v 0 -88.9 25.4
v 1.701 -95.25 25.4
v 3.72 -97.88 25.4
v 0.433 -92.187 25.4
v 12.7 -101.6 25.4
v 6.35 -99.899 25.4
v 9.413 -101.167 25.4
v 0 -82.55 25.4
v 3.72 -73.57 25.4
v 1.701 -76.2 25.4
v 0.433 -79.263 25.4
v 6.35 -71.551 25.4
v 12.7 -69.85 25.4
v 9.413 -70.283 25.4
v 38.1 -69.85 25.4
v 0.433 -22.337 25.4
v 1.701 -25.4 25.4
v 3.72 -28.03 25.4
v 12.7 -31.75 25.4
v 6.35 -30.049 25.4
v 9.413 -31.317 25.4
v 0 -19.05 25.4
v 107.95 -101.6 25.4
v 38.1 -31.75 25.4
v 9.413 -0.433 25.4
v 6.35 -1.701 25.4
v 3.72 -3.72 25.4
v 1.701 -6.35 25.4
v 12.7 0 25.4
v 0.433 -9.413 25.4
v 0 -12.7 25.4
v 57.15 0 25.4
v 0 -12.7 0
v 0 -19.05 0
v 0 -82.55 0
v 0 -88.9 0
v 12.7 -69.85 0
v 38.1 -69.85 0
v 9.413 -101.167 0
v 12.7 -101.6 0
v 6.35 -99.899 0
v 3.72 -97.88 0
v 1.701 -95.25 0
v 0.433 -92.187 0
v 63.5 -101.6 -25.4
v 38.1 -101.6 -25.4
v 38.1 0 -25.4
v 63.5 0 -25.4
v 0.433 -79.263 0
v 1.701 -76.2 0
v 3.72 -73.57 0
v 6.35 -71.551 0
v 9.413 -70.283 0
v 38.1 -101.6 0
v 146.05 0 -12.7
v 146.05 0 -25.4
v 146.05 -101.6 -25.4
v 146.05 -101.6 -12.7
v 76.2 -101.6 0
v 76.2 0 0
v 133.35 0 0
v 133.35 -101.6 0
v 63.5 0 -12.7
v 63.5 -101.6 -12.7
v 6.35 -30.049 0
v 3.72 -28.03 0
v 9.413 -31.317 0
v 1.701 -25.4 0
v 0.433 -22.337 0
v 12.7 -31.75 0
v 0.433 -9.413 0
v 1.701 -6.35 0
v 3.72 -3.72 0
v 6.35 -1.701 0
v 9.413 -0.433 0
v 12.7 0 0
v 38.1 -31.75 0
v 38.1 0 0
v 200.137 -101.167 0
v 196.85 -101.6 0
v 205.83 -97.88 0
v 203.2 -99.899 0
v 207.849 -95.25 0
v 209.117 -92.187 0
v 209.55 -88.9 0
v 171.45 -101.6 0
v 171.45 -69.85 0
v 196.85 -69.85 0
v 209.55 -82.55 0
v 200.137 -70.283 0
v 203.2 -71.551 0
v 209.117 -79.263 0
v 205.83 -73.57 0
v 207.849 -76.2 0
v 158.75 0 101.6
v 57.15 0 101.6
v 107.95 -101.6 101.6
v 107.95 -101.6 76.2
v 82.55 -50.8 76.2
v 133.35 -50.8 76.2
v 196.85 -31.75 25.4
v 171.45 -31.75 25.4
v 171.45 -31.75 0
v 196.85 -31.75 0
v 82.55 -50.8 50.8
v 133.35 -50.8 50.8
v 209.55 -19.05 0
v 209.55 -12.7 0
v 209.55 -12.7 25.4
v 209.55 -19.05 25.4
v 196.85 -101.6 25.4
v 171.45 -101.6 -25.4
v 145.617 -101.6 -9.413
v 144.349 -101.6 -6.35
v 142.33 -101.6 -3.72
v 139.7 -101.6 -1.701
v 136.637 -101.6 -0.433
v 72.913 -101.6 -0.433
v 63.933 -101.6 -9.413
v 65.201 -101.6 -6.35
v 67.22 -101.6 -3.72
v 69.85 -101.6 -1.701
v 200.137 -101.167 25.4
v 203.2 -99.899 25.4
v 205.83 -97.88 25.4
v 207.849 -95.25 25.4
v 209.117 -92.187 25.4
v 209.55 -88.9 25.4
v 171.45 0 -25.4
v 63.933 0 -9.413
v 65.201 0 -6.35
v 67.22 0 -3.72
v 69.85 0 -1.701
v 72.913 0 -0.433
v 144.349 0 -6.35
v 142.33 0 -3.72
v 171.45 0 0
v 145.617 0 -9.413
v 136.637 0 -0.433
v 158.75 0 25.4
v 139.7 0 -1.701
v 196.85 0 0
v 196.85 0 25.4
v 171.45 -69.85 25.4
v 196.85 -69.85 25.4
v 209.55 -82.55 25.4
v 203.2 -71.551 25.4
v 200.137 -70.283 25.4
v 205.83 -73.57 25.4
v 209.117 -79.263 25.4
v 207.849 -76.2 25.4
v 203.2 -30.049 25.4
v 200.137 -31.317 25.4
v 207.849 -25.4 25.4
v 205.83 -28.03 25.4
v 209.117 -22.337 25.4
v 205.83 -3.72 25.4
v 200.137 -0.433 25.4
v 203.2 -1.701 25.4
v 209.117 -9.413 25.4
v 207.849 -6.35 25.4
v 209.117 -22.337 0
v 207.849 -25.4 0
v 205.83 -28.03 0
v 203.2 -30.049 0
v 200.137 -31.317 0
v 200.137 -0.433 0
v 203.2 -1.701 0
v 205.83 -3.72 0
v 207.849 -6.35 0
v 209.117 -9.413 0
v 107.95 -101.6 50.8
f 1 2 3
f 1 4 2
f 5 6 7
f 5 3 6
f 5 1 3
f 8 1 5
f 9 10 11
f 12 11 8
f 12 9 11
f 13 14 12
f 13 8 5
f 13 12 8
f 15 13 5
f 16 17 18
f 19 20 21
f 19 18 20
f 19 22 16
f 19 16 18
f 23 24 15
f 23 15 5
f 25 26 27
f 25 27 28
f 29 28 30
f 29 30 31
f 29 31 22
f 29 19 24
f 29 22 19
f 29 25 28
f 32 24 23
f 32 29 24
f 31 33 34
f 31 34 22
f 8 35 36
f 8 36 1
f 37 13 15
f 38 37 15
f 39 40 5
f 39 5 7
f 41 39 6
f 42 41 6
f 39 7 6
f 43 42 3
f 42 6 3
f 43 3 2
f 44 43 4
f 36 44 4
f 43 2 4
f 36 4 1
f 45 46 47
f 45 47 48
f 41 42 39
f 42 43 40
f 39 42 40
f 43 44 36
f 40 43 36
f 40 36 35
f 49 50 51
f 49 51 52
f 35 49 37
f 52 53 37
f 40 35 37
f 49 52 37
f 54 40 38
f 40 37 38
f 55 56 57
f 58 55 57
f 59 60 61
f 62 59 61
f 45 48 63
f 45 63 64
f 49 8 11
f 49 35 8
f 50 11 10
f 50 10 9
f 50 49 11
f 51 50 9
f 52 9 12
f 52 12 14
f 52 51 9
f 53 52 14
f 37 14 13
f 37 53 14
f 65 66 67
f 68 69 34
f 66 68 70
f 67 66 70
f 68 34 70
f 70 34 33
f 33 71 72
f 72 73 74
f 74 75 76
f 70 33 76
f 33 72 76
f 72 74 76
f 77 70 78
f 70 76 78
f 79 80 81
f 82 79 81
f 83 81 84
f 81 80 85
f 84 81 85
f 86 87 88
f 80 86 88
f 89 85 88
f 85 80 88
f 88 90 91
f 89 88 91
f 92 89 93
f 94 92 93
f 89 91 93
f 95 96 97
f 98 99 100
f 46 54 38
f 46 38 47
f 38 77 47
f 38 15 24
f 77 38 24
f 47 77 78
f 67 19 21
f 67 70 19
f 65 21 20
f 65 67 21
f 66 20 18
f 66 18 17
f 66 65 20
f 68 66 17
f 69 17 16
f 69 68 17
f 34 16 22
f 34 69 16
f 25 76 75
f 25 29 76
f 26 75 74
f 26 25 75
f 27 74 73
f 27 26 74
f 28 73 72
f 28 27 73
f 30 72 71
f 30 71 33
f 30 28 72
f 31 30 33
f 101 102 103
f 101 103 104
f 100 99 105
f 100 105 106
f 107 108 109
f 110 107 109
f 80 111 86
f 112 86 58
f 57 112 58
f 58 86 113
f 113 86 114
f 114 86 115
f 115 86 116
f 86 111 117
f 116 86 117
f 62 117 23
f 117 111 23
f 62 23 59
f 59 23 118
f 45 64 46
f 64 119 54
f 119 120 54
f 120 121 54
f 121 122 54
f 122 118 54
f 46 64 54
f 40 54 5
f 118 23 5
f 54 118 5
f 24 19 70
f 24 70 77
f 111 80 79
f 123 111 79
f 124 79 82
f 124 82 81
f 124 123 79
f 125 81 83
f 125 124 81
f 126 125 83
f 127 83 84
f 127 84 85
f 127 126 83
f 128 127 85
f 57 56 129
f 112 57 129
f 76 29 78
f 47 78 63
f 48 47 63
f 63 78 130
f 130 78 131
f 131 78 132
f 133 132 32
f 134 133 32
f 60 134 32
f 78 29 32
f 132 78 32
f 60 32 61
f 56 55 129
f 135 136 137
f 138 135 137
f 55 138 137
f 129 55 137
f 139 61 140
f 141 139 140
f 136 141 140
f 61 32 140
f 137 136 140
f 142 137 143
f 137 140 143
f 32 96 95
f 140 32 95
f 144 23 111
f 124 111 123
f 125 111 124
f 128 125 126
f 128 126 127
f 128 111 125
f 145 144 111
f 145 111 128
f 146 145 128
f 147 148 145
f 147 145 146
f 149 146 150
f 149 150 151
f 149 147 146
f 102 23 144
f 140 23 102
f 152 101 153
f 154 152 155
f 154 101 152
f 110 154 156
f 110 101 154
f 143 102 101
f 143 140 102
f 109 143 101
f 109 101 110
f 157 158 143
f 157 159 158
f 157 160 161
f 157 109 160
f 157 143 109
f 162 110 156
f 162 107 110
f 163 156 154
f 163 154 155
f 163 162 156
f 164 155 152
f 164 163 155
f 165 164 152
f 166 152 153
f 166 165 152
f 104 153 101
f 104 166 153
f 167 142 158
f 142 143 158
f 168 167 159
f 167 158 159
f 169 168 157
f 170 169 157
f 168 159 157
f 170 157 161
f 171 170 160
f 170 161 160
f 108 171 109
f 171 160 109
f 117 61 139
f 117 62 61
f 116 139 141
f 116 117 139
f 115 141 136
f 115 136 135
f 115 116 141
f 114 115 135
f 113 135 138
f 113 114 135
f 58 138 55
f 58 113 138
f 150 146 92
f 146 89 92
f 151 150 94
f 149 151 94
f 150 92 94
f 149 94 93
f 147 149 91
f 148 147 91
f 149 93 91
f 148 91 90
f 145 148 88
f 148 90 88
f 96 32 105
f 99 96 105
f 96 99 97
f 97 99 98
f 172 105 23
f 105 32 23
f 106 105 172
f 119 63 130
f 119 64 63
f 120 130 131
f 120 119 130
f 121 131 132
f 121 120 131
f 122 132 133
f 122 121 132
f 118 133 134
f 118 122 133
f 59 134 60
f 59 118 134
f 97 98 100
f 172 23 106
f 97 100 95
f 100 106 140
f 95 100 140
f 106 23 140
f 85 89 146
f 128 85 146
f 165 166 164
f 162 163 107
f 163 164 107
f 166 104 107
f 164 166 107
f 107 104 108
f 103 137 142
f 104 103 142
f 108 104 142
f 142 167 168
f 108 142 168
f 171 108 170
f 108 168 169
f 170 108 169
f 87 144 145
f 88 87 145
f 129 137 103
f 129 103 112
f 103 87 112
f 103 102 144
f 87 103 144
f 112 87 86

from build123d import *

# Parameters (mm, degrees)
F0_W      = 209.55
F0_H      = 25.4
F1_DEPTH  = 101.6
F2_W      = 38.1
F2_H      = 38.1
F3_DEPTH  = 25.401
F5_DEPTH  = 25.4
F6_W      = 82.55
F6_H      = 101.6
F7_DEPTH  = 25.4
F9_DEPTH  = 76.2
F10_W     = 50.8
F10_H     = 25.4
F11_DEPTH = 50.8
F12_R     = 12.7


with BuildPart() as f1:
    # F0 (on Front) → F1 (new body)
    with BuildSketch(Plane.XZ):
        with Locations((104.775, 12.7)):
            Rectangle(F0_W, F0_H)
    extrude(amount=F1_DEPTH)

    # F2 (on face) → F3 (cut, through all)
    with BuildSketch(Plane.XY.offset(25.4)):
        with Locations((19.05, -50.8)):
            Rectangle(F2_W, F2_H)
        with Locations((190.5, -50.8)):
            Rectangle(F2_W, F2_H)
    extrude(amount=-F3_DEPTH, mode=Mode.SUBTRACT)

    # F4 (on face) → F5 (join)
    with BuildSketch(Plane(origin=(0, 0, 0), x_dir=(1, 0, 0), z_dir=(0, 0, -1))):
        Polygon((171.45, 101.6), (38.1, 101.6), (38.1, 69.85), (38.1, 31.75), (38.1, 0), (171.45, 0), (171.45, 31.75), (171.45, 69.85), align=None)
    extrude(amount=F5_DEPTH)

    # F6 (on face) → F7 (cut)
    with BuildSketch(Plane(origin=(0, 0, -25.4), x_dir=(1, 0, 0), z_dir=(0, 0, -1))):
        with Locations((104.775, 50.8)):
            Rectangle(F6_W, F6_H)
    extrude(amount=-F7_DEPTH, mode=Mode.SUBTRACT)

    # F8 (on face) → F9 (join)
    with BuildSketch(Plane.XY.offset(25.4)):
        Polygon((158.75, 0), (57.15, 0), (107.95, -101.6), align=None)
    extrude(amount=F9_DEPTH)

    # F10 (on face) → F11 (cut)
    with BuildSketch(Plane.XZ.offset(101.6)):
        with Locations((107.95, 63.5)):
            Rectangle(F10_W, F10_H)
    extrude(amount=-F11_DEPTH, mode=Mode.SUBTRACT)

    # F12
    f12_edges = [f1.edges().sort_by_distance(p)[0] for p in [
        (0, -101.6, 12.7),
        (0, -69.85, 12.7),
        (0, -31.75, 12.7),
        (0, 0, 12.7),
        (209.55, 0, 12.7),
        (209.55, -31.75, 12.7),
        (209.55, -69.85, 12.7),
        (209.55, -101.6, 12.7),
        (63.5, -50.8, 0),
        (146.05, -50.8, 0),
    ]]
    fillet(f12_edges, radius=F12_R)


solid = f1.part
